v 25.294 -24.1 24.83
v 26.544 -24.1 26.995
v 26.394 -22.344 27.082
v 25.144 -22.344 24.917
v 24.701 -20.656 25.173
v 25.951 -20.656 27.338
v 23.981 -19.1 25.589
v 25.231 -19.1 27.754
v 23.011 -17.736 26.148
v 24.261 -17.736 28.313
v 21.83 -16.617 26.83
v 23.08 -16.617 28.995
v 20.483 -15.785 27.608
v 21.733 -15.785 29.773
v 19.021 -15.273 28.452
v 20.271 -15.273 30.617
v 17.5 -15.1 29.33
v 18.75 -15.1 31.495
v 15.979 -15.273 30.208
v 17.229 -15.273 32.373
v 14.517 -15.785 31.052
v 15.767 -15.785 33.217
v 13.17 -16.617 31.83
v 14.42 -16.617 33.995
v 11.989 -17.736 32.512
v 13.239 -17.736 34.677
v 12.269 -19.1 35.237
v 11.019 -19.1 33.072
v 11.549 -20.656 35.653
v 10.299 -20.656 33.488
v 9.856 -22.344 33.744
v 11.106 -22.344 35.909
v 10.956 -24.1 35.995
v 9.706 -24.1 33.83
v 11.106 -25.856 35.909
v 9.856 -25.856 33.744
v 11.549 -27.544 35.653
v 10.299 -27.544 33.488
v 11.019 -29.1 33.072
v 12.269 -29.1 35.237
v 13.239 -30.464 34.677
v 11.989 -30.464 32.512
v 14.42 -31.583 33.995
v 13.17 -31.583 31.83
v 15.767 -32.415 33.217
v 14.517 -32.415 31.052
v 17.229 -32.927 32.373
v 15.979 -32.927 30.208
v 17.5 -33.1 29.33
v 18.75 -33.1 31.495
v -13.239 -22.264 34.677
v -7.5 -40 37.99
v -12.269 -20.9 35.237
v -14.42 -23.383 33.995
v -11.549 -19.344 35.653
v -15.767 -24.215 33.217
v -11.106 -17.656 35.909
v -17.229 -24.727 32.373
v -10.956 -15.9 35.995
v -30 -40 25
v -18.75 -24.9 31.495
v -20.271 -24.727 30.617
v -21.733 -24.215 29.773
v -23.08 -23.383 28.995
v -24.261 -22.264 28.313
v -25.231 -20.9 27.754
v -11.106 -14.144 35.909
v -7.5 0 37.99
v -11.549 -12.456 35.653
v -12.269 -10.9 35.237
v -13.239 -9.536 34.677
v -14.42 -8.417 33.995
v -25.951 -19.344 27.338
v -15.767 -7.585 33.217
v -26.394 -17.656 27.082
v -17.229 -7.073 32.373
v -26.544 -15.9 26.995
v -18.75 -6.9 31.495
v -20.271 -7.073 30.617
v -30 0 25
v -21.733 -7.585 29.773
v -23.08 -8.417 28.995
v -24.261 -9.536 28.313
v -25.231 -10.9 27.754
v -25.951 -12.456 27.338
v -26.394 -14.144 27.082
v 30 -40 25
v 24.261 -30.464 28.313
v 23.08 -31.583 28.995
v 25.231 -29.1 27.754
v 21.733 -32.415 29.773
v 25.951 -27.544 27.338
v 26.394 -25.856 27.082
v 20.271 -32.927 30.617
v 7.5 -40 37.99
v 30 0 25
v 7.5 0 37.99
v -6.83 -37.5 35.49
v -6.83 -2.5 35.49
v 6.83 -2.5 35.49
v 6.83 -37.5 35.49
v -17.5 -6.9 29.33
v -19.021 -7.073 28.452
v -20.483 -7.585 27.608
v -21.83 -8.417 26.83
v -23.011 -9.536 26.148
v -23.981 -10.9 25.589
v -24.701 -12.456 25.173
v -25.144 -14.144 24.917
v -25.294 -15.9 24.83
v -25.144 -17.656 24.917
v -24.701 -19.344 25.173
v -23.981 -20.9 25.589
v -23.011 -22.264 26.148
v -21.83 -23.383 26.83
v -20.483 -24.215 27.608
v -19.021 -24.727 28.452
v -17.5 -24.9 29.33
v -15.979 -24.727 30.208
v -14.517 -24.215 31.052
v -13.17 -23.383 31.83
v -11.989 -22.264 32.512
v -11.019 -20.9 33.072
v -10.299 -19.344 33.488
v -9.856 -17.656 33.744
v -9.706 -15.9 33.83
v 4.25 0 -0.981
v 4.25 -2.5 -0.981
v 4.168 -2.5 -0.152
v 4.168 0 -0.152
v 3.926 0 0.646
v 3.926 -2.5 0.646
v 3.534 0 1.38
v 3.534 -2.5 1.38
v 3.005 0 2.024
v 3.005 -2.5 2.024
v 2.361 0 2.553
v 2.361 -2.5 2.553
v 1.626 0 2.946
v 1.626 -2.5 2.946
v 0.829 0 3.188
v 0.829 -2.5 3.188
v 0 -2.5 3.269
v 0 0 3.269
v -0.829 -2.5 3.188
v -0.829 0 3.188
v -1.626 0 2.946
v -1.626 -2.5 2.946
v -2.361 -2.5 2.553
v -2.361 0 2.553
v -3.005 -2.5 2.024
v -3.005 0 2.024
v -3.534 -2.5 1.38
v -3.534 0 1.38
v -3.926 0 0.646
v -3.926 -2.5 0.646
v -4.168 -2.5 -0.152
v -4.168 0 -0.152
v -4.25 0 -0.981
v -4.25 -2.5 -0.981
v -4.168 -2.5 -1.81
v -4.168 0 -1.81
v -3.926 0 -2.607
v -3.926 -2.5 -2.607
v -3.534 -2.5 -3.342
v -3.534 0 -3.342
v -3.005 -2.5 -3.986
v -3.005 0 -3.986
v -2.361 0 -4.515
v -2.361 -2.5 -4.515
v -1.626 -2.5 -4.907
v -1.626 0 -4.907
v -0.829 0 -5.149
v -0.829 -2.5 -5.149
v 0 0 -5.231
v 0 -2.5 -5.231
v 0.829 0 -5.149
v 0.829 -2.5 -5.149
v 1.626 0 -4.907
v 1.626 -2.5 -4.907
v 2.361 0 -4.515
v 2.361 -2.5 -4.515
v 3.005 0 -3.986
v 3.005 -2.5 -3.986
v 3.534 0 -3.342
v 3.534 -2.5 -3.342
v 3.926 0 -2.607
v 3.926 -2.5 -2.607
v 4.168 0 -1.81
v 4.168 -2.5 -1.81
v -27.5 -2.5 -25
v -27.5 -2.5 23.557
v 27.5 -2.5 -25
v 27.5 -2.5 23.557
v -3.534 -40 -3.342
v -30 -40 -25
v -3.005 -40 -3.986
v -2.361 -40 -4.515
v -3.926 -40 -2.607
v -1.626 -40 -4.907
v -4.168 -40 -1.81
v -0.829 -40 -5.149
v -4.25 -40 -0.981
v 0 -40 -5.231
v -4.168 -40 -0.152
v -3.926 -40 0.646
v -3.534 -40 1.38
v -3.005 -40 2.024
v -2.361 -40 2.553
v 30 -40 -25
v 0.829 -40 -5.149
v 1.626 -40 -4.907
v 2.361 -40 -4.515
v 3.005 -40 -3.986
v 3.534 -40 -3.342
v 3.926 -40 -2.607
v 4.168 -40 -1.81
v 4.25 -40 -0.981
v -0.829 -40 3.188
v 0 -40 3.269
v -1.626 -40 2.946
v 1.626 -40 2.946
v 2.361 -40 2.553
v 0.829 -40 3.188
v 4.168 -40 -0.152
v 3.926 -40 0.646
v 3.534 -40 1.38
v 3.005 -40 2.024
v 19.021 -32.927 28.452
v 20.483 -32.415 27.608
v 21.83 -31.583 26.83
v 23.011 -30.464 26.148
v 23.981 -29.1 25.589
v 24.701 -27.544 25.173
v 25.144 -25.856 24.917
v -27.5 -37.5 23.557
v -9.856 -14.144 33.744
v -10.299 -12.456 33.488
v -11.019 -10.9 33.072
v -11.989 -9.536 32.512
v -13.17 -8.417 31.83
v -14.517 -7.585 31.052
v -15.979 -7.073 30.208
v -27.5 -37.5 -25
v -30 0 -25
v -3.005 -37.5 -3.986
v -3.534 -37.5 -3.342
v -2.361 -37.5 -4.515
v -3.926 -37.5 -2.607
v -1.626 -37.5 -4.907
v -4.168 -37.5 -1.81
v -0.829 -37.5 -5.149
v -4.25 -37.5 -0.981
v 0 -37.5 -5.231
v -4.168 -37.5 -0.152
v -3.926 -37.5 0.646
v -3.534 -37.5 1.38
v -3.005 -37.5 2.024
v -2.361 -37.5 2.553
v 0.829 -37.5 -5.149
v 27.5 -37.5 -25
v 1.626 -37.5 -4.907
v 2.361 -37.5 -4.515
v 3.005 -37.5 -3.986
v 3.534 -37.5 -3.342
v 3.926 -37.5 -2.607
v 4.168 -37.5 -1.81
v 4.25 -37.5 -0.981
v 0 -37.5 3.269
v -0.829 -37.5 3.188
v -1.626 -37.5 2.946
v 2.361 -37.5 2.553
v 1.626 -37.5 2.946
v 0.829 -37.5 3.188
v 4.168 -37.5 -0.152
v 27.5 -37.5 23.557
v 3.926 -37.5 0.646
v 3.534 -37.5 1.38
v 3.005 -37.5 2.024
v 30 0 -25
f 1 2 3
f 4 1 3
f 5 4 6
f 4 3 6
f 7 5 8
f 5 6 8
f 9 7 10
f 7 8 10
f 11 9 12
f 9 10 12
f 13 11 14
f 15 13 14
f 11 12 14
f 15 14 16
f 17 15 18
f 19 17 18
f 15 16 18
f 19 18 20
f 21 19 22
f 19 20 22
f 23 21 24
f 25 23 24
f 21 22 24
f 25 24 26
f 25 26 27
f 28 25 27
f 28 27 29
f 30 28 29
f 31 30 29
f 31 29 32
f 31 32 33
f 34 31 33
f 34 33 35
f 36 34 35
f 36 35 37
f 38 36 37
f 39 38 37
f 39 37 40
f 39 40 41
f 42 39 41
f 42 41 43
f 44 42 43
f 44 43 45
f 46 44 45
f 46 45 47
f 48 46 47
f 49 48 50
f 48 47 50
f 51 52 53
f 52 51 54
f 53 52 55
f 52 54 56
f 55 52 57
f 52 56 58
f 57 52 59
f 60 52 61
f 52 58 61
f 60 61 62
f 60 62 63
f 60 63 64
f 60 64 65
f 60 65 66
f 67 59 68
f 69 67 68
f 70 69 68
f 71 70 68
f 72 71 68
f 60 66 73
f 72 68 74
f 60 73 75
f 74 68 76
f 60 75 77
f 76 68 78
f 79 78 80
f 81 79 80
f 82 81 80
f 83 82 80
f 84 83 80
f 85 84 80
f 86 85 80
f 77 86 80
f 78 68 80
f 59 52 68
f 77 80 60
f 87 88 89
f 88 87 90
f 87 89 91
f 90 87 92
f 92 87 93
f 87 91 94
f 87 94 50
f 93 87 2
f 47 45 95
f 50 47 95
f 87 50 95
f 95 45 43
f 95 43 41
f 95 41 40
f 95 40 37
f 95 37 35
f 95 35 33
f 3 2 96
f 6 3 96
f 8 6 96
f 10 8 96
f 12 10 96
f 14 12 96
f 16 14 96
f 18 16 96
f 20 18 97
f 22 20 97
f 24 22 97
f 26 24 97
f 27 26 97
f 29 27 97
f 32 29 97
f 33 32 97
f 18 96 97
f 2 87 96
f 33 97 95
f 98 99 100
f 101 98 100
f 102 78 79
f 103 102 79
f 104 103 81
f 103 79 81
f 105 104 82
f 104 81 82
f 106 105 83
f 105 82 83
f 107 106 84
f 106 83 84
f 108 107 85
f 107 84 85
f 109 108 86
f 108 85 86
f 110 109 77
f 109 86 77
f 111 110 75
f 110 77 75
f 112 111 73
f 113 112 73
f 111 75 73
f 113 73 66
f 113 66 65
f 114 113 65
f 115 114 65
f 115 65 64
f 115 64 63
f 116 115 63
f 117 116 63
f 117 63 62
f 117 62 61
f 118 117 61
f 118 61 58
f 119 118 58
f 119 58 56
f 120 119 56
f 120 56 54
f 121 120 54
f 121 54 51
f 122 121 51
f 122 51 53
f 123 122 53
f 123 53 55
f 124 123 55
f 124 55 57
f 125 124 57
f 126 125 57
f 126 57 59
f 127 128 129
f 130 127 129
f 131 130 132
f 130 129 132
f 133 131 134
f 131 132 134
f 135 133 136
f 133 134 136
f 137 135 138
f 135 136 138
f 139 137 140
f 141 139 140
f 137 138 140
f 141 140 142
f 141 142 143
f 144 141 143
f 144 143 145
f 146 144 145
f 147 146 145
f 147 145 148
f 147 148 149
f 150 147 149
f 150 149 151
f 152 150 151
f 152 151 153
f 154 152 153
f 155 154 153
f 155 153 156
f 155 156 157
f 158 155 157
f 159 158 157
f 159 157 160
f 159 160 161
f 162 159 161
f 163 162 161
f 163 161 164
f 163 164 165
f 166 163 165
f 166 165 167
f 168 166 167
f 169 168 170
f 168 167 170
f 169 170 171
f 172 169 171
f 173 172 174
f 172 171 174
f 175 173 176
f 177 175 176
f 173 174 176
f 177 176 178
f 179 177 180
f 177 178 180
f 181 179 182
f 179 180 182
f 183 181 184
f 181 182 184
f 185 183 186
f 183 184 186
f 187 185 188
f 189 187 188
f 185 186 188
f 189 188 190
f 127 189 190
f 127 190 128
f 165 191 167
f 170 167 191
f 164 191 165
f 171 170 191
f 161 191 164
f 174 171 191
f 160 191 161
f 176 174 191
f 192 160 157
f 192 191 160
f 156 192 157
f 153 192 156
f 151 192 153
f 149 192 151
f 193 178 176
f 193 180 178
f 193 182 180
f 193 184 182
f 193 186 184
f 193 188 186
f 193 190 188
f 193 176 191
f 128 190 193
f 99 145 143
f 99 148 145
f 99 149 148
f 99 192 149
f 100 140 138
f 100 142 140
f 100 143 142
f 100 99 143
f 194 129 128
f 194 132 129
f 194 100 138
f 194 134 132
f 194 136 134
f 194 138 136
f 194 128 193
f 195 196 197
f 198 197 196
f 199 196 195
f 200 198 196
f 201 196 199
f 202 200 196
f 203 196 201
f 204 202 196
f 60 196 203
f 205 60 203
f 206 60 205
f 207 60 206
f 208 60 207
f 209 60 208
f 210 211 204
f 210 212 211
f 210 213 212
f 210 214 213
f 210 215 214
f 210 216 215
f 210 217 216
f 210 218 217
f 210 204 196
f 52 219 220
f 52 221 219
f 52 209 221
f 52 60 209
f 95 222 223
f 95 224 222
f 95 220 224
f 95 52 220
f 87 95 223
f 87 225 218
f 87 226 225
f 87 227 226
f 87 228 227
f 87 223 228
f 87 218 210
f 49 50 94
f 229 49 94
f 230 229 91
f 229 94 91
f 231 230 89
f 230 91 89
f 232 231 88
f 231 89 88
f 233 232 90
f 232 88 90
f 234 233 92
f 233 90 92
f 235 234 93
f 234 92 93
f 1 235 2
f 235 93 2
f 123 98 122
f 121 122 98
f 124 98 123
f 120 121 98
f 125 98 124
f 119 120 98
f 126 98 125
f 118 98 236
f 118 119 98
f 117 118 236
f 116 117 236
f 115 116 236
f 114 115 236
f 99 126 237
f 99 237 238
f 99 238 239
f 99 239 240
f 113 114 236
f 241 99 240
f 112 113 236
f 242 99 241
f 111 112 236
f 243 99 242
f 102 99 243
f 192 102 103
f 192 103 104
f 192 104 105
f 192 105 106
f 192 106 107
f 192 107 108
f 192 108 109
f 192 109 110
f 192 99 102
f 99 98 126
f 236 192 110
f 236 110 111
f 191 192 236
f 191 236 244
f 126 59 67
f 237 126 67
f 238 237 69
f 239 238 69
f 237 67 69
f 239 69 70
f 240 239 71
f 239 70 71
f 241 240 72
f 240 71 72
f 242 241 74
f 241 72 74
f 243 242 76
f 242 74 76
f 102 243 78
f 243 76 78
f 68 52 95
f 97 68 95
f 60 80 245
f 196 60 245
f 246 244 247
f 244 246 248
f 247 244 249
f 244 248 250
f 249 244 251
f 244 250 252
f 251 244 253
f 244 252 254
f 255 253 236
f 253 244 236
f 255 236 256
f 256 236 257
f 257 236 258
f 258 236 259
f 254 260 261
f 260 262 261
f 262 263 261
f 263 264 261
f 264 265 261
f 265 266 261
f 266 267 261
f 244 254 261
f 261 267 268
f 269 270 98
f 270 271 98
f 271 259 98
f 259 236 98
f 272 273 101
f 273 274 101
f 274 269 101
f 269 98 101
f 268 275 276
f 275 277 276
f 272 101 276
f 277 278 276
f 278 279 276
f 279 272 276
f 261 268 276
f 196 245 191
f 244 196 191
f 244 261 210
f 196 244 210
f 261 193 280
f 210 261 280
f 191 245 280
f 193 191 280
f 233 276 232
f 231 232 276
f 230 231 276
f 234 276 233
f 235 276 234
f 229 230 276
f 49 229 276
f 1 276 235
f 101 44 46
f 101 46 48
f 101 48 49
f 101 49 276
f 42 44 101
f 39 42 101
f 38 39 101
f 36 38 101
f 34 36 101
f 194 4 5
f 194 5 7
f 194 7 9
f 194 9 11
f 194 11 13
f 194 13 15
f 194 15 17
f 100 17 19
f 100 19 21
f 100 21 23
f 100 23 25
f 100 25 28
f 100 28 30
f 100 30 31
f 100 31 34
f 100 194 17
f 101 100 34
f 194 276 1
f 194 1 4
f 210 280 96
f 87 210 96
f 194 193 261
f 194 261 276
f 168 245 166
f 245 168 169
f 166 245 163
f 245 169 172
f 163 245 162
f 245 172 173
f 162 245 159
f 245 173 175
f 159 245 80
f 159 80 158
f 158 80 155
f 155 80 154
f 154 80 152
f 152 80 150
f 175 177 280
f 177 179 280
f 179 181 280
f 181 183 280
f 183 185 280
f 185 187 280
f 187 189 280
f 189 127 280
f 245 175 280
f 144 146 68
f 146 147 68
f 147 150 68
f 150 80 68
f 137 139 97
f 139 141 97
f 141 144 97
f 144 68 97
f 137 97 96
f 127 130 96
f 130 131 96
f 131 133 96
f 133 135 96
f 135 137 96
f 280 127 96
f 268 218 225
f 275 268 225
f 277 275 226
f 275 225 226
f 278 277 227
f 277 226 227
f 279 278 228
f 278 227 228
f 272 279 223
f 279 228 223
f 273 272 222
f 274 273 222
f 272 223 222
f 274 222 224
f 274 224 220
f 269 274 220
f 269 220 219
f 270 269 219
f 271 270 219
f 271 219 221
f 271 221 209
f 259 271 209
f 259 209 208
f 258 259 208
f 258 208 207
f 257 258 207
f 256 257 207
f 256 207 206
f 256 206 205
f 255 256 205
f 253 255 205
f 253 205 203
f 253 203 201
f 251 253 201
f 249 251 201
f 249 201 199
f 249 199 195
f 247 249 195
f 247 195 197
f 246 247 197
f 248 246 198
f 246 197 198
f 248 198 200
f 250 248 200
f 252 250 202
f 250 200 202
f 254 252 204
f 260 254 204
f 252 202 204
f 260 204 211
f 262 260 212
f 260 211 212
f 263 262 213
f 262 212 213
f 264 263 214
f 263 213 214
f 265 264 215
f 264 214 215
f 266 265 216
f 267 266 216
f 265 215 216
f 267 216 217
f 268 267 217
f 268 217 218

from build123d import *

# Parameters (mm, degrees)
F0_W     = 15
F0_H     = 12.9903810568
F1_DEPTH = 40
F4_T     = -2.5
F5_DEPTH = 25
F6_DEPTH = 25
F7_R     = 4.25
F8_DEPTH = 40


with BuildPart() as f1:
    # F0 (on Front) → F1 (new body)
    with BuildSketch(Plane.XZ):
        Polygon((30, 25), (15, 25), (0, -0.9807621135), (-15, 25), (-30, 25), (-30, -25), (30, -25), align=None)
        Polygon((7.5, 37.9903810568), (7.5, 25), (15, 25), (18.75, 31.4951905284), align=None)
        with Locations((0, 31.4951905284)):
            Rectangle(F0_W, F0_H)
        Polygon((-15, 25), (-7.5, 25), (-7.5, 37.9903810568), (-18.75, 31.4951905284), align=None)
        Polygon((-30, 25), (-15, 25), (-18.75, 31.4951905284), align=None)
        Polygon((18.75, 31.4951905284), (15, 25), (30, 25), align=None)
        Polygon((15, 25), (7.5, 25), (-7.5, 25), (-15, 25), (0, -0.9807621135), align=None)
    extrude(amount=F1_DEPTH)

    # F4
    f4_openings = [f1.faces().sort_by_distance(p)[0] for p in [
        (0, -20, -25),
    ]]
    offset(amount=F4_T, openings=f4_openings)

    # F3 (on face) → F5 (cut)
    with BuildSketch(Plane(origin=(18.3253175473, 0, 31.7403810568), x_dir=(0.8660254038, 0, -0.5), z_dir=(0.5, 0, 0.8660254038))):
        with BuildLine():
            ThreePointArc((9.4903810568, -24.1), (-5.8735799739, -17.7360389693), (0.4903810568, -33.1))
            ThreePointArc((0.4903810568, -33.1), (6.8543420874, -30.4639610307), (9.4903810568, -24.1))
        make_face()
    extrude(amount=-F5_DEPTH, mode=Mode.SUBTRACT)

    # F2 (on face) → F6 (cut)
    with BuildSketch(Plane(origin=(-18.3253175473, 0, 31.7403810568), x_dir=(0.8660254038, 0, 0.5), z_dir=(-0.5, 0, 0.8660254038))):
        with BuildLine():
            ThreePointArc((8.5096189432, -15.9), (5.8735799739, -9.5360389693), (-0.4903810568, -6.9))
            ThreePointArc((-0.4903810568, -6.9), (-6.8543420874, -22.2639610307), (8.5096189432, -15.9))
        make_face()
    extrude(amount=-F6_DEPTH, mode=Mode.SUBTRACT)

    # F7 (on face) → F8 (cut)
    with BuildSketch(Plane.XZ.offset(40)):
        with Locations((0, -0.9807621135)):
            Circle(F7_R)
    extrude(amount=-F8_DEPTH, mode=Mode.SUBTRACT)


solid = f1.part
